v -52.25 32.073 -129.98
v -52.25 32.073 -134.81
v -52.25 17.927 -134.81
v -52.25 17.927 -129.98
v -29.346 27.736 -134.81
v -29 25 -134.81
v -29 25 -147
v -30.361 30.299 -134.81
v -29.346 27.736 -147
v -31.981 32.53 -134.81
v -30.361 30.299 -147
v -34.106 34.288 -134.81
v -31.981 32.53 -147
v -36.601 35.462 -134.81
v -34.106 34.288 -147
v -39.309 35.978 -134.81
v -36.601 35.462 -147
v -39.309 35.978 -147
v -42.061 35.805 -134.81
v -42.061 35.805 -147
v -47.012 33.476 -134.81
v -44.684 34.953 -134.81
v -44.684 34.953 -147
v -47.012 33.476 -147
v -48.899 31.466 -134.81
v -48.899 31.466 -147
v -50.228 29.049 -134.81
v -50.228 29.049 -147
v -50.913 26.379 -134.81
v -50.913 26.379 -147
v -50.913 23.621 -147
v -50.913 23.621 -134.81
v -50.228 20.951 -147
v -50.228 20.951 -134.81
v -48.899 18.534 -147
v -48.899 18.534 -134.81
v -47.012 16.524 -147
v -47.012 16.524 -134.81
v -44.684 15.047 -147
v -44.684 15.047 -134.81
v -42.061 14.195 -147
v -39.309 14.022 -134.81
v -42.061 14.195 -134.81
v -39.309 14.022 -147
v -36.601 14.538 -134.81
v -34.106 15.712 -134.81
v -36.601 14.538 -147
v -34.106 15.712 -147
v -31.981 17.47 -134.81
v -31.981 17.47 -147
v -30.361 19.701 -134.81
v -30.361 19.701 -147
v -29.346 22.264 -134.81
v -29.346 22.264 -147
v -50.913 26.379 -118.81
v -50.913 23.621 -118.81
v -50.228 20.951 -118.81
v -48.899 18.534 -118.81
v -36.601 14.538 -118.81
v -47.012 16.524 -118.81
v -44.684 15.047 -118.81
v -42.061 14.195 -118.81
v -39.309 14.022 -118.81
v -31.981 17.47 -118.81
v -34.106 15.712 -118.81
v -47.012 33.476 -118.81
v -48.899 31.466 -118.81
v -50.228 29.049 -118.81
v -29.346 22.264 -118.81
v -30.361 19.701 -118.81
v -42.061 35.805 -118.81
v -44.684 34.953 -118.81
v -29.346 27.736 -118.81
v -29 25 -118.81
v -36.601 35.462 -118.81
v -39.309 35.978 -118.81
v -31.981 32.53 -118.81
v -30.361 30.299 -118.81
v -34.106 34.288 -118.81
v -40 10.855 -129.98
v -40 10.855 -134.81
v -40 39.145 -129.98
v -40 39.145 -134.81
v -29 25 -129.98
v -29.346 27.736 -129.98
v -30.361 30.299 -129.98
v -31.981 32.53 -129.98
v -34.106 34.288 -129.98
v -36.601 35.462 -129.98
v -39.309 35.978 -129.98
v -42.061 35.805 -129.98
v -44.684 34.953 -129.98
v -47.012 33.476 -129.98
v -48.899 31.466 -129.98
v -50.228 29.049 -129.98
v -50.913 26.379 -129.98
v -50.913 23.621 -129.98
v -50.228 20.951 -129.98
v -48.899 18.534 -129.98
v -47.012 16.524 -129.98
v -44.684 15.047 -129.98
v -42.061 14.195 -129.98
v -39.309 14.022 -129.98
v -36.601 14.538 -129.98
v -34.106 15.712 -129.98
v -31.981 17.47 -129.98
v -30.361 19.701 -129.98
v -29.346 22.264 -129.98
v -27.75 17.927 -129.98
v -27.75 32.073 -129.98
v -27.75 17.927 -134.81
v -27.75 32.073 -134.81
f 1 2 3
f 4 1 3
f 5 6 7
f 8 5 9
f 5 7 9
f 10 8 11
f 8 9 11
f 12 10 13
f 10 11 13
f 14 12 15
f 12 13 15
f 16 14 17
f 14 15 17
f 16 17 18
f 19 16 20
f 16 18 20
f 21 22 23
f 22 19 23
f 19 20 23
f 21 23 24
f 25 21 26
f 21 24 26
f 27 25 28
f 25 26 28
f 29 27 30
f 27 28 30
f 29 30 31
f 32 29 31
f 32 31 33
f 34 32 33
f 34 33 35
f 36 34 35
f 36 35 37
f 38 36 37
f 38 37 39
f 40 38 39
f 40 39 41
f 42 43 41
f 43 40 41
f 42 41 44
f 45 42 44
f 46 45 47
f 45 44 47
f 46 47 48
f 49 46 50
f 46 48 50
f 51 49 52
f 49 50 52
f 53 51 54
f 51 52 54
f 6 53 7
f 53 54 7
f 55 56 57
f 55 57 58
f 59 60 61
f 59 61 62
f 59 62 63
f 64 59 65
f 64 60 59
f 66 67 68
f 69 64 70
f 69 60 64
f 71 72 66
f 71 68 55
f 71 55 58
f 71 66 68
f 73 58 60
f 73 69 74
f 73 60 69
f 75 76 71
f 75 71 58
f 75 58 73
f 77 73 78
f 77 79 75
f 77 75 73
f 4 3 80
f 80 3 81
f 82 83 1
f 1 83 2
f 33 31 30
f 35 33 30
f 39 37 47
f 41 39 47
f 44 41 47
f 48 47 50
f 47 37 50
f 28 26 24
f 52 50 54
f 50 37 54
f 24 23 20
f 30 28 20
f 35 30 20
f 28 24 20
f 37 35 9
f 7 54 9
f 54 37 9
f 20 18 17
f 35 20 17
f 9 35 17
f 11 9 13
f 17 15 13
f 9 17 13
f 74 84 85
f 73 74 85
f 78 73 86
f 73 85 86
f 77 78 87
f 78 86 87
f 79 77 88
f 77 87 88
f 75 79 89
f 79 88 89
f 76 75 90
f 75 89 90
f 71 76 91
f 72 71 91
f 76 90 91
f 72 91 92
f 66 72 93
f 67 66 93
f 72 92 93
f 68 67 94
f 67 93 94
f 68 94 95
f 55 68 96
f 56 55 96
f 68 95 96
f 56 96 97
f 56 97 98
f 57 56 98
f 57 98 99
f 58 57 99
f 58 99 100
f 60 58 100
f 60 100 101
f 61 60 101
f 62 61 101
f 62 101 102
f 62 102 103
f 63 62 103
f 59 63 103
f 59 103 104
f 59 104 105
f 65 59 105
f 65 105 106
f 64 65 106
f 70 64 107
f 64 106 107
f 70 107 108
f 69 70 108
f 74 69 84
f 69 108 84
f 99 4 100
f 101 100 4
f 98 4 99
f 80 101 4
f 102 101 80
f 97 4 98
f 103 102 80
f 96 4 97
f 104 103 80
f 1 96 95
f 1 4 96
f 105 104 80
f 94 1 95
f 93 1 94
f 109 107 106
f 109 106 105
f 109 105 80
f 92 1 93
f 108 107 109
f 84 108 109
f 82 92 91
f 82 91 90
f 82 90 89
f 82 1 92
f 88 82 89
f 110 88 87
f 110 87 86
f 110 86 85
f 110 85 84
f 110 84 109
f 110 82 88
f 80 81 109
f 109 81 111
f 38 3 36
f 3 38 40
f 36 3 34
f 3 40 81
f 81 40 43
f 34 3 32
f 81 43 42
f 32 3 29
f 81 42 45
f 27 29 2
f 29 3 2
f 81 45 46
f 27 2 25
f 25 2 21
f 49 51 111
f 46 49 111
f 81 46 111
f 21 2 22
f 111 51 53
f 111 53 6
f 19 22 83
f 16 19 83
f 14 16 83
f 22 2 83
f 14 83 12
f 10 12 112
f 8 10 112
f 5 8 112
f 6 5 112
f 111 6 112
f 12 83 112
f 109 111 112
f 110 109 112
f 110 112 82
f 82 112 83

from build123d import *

# Parameters (mm, degrees)
EXTRUDE_DEPTH     = 4.83
CYLINDER002_R     = 11
CYLINDER002_DEPTH = 28.19


with BuildPart() as extrude_body:
    # Sketch → Extrude (new body)
    with BuildSketch(Plane.XY):
        Polygon((12.25, -7.072541), (12.25, 7.072541), (0, 14.145082), (-12.25, 7.072541), (-12.25, -7.072541), (0, -14.145082), align=None)
    extrude(amount=EXTRUDE_DEPTH)


with BuildPart() as extrude_body_1:
    # Extrude placement: moved
    add(extrude_body.part.moved(Location((0, 0, 12.19))))


with BuildPart() as powerplug:
    # Cylinder002 → Cylinder002 (new body)
    with BuildSketch(Plane.XY):
        Circle(CYLINDER002_R)
    extrude(amount=CYLINDER002_DEPTH)

    # Fusion: union Extrude body
    add(extrude_body_1.part)


with BuildPart() as powerplug_1:
    # Fusion placement: moved
    add(powerplug.part.moved(Location((-40, 25, -147))))


solid = powerplug_1.part
